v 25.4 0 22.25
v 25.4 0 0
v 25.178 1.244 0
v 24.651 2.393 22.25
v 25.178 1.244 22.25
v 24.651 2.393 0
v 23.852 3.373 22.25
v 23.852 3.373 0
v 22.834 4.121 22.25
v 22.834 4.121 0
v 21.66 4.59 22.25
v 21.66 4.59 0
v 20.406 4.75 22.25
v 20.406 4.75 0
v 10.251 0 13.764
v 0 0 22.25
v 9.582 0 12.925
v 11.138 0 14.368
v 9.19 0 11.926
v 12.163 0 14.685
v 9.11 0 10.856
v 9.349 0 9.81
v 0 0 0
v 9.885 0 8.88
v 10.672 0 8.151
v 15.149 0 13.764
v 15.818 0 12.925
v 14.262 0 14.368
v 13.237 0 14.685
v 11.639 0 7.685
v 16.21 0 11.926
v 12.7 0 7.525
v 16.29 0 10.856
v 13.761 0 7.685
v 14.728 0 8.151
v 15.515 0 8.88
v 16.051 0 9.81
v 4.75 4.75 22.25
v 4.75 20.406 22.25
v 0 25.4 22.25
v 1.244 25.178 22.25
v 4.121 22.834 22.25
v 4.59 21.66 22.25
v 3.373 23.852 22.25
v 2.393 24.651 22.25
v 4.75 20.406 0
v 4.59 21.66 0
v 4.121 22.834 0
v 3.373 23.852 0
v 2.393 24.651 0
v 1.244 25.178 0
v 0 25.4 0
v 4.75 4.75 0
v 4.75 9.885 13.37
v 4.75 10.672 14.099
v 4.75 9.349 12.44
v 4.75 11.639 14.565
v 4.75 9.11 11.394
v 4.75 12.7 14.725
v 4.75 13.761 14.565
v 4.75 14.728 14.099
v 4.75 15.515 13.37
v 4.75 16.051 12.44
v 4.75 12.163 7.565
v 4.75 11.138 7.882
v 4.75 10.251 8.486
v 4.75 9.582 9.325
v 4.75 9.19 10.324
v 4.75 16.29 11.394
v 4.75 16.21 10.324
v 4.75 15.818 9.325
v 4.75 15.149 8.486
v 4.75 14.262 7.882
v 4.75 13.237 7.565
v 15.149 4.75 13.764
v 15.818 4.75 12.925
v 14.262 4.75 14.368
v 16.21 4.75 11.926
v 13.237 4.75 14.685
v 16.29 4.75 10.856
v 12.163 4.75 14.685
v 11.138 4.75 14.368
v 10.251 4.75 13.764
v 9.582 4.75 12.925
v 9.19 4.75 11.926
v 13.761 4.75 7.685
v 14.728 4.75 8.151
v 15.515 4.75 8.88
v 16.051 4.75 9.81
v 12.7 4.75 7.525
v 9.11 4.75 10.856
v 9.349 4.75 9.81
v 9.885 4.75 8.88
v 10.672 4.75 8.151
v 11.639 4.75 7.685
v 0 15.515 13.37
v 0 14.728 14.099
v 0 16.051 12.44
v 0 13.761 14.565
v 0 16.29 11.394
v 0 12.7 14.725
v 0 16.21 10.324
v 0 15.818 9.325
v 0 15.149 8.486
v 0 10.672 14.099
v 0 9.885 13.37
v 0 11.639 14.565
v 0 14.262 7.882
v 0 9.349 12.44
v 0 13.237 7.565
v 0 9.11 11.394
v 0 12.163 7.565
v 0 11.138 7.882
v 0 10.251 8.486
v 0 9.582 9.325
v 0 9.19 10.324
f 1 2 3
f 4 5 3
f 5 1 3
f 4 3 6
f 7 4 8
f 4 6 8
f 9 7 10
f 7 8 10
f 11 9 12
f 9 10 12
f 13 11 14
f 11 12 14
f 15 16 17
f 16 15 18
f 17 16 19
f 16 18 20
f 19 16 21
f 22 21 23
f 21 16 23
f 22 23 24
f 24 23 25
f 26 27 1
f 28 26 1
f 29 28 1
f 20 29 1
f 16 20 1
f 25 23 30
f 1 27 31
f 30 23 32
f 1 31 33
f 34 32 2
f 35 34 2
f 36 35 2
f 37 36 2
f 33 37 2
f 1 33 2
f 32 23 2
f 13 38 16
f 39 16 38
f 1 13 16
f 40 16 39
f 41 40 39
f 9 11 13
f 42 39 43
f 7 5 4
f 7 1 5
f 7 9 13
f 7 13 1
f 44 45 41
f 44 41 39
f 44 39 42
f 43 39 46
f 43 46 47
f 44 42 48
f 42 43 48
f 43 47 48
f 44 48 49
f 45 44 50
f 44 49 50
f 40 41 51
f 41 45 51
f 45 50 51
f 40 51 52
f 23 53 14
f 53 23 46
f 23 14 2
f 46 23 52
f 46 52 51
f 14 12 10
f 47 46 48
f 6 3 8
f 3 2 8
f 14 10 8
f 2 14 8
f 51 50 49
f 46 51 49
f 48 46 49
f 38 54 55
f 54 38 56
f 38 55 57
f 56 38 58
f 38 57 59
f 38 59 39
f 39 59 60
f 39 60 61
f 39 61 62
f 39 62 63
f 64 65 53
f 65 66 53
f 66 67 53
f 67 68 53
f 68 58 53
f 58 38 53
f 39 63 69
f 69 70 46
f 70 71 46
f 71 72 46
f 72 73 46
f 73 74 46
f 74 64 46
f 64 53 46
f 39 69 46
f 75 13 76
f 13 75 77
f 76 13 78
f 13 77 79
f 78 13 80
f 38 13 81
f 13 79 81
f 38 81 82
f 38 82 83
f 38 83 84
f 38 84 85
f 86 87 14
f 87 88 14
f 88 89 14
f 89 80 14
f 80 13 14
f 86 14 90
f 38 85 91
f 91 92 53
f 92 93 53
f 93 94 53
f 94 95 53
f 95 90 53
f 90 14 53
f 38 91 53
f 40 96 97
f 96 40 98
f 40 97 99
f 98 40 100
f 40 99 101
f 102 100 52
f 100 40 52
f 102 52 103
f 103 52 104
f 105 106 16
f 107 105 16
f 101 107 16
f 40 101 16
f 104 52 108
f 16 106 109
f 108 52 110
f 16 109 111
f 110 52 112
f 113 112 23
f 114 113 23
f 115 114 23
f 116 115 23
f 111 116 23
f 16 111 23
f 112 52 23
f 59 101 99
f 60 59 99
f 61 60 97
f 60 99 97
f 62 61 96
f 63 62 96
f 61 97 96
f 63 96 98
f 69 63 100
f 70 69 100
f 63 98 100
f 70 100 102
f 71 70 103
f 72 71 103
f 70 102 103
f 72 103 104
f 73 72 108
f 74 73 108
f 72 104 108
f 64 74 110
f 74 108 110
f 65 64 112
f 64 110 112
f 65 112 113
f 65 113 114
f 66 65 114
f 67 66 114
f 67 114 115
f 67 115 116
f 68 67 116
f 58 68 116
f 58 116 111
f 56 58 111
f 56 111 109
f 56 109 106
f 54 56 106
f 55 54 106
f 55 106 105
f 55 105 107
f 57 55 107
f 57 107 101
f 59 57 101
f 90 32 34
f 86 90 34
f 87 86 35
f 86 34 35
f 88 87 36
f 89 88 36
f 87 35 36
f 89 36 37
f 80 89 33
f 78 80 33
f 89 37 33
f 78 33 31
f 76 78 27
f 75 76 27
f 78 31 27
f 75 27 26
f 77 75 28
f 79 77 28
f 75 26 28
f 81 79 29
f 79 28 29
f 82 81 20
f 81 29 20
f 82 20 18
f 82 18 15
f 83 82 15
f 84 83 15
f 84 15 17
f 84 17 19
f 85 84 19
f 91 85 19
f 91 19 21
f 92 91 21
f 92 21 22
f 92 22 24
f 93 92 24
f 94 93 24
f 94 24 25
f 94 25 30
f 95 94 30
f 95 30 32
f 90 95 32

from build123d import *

# Parameters (mm, degrees)
BOSS_EXTRUDE1_DEPTH = 22.25
FILLET1_R           = 5
CUT_EXTRUDE1_REACH  = 44.254
SKETCH6_R           = 3.6
CUT_EXTRUDE2_REACH  = 44.254
SKETCH7_R           = 3.6


with BuildPart() as part:
    # Sketch2 → Boss-Extrude1 (new body)
    with BuildSketch(Plane.XY):
        Polygon((0, 25.4), (0, 0), (25.4, 0), (25.4, 4.75), (4.75, 4.75), (4.75, 25.4), align=None)
    extrude(amount=BOSS_EXTRUDE1_DEPTH)

    # Fillet1
    # the kernel refuses this fillet: 5 mm, written as the material it takes off along each edge
    with BuildSketch(Plane(origin=(4.75, 25.4, -12.484365222), x_dir=(0, -1, 0), z_dir=(0, 0, 1))) as fillet1_piece_1:
        with BuildLine():
            CenterArc((4.993746089, -5), FILLET1_R, 90, 87.134016017)
            Line((0, -4.75), (-0.099874922, -4.745))
            ThreePointArc((-0.099874922, -4.745), (-0.1, -2.375), (-0.1, 0))
            Line((-0.1, 0), (0, 0.1))
            Line((0, 0.1), (4.993746089, 0.1))
            Line((4.993746089, 0.1), (4.993746089, 0))
        make_face()
    extrude(amount=47.218730444, mode=Mode.SUBTRACT)
    with BuildSketch(Plane(origin=(25.4, 4.75, -12.484365222), x_dir=(0, -1, 0), z_dir=(0, 0, 1))) as fillet1_piece_2:
        with BuildLine():
            CenterArc((5, -4.993746089), FILLET1_R, 92.865983983, 87.134016017)
            Line((0, -4.993746089), (-0.1, -4.993746089))
            Line((-0.1, -4.993746089), (-0.1, 0))
            Line((-0.1, 0), (0, 0.1))
            ThreePointArc((0, 0.1), (2.375, 0.1), (4.745, 0.099874922))
            Line((4.745, 0.099874922), (4.75, 0))
        make_face()
    extrude(amount=47.218730444, mode=Mode.SUBTRACT)

    # Sketch6 → Cut-Extrude1 (cut, up to next)
    with BuildSketch(Plane.XZ, mode=Mode.PRIVATE) as cut_extrude1_sk1:
        with Locations(Location((12.7, 11.125, 0), (0, 0, 270))):
            Circle(SKETCH6_R)
    cut_extrude1_tool1 = extrude(cut_extrude1_sk1.sketch, amount=-CUT_EXTRUDE1_REACH, mode=Mode.PRIVATE) & part.part
    add(cut_extrude1_tool1.solids().sort_by_distance((12.7, 0, 11.125))[0], mode=Mode.SUBTRACT)

    # Sketch7 → Cut-Extrude2 (cut, up to next)
    with BuildSketch(Plane.ZY, mode=Mode.PRIVATE) as cut_extrude2_sk1:
        with Locations((11.125, 12.7)):
            Circle(SKETCH7_R)
    cut_extrude2_tool1 = extrude(cut_extrude2_sk1.sketch, amount=-CUT_EXTRUDE2_REACH, mode=Mode.PRIVATE) & part.part
    add(cut_extrude2_tool1.solids().sort_by_distance((0, 12.7, 11.125))[0], mode=Mode.SUBTRACT)


solid = part.part
